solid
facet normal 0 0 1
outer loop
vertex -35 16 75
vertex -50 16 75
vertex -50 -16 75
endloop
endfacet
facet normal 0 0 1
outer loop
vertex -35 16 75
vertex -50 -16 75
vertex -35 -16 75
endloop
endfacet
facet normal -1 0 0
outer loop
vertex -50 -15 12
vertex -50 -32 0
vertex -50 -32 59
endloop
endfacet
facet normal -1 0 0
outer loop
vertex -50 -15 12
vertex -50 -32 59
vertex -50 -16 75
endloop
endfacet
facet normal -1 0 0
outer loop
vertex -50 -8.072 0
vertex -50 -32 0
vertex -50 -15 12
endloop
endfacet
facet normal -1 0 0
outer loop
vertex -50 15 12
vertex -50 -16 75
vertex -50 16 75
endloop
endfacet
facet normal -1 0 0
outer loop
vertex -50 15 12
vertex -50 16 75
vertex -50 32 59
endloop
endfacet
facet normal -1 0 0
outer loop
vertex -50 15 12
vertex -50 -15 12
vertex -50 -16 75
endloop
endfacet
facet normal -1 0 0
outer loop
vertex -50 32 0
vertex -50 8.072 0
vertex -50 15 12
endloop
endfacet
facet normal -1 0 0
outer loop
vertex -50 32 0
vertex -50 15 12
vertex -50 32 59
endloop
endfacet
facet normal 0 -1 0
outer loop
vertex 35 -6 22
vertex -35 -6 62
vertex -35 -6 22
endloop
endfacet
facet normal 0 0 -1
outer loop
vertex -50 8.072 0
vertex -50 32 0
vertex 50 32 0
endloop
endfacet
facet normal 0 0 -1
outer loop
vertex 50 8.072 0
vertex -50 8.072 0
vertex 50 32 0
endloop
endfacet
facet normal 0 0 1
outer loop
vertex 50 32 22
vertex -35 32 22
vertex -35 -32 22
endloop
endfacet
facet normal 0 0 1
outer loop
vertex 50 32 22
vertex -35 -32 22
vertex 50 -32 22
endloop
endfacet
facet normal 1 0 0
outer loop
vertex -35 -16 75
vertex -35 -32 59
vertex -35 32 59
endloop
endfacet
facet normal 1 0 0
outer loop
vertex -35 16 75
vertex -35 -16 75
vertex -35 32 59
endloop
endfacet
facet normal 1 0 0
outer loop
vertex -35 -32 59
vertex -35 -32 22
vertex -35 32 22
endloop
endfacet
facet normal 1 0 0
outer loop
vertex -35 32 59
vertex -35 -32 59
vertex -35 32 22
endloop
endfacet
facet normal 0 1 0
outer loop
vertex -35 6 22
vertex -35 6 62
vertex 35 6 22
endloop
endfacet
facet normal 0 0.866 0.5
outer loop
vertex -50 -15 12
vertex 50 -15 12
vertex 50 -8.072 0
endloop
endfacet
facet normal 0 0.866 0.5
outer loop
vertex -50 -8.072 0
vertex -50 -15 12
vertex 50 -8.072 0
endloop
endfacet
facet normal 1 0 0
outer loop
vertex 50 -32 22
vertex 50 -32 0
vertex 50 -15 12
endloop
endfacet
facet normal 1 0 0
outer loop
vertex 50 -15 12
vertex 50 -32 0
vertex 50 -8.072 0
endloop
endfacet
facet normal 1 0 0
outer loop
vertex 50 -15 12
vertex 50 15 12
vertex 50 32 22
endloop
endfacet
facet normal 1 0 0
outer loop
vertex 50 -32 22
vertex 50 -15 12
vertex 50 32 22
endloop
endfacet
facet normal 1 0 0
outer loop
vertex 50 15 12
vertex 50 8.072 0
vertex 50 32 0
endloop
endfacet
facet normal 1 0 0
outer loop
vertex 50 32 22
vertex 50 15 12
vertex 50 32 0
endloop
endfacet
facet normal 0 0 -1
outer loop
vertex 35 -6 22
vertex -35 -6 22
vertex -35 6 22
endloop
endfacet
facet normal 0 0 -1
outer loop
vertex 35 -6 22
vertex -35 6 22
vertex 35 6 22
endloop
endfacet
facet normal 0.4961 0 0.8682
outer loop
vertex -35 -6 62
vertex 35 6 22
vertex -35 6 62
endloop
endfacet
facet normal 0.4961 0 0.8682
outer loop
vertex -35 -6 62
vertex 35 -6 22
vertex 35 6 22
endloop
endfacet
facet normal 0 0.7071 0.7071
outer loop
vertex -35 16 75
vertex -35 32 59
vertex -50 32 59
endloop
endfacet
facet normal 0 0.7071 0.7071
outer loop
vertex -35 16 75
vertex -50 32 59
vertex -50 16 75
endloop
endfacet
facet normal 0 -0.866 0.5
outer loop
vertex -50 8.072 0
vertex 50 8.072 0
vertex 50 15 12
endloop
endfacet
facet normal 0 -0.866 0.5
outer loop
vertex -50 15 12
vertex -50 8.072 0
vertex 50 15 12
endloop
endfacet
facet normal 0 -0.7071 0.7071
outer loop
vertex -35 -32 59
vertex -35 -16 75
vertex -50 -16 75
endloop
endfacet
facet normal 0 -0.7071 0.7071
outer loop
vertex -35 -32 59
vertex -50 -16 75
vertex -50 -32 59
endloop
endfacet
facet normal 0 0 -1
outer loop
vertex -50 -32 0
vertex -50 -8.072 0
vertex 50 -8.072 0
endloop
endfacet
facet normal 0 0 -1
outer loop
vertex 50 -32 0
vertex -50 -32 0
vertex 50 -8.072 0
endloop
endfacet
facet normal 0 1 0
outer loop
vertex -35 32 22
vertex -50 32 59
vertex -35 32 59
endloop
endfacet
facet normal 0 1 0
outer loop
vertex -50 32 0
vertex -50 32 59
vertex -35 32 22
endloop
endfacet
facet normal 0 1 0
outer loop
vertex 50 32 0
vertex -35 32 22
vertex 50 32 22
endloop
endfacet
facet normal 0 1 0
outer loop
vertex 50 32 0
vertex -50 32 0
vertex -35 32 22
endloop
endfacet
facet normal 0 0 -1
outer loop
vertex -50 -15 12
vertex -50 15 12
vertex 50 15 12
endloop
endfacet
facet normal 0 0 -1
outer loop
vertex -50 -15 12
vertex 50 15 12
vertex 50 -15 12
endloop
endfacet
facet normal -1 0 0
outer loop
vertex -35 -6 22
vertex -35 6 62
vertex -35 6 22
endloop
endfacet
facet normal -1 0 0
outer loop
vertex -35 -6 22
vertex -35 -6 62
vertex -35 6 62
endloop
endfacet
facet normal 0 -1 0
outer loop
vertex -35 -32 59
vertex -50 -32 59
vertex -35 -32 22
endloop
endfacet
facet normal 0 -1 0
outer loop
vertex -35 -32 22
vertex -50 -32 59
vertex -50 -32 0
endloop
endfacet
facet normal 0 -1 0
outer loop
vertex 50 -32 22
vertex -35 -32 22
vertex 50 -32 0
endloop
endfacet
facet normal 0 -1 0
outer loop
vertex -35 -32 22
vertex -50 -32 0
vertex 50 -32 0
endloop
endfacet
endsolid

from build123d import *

# Parameters (mm, degrees)
PAD002_DEPTH    = 6
SKETCH_W        = 100
SKETCH_H        = 64
PAD_DEPTH       = 22
SKETCH001_W     = 15
SKETCH001_H     = 64
PAD001_DEPTH    = 53
POCKET_DEPTH    = 100.001
POCKET001_DEPTH = 15.001


with BuildPart() as pad002:
    # Sketch003 → Pad002 (new body, symmetric)
    with BuildSketch(Plane.XZ):
        Polygon((-35, 62), (-35, 22), (35, 22), align=None)
    extrude(amount=PAD002_DEPTH, both=True)


with BuildPart() as pocket001:
    # Sketch → Pad (new body)
    with BuildSketch(Plane.XY):
        Rectangle(SKETCH_W, SKETCH_H)
    extrude(amount=PAD_DEPTH)

    # Sketch001 → Pad001 (new body)
    with BuildSketch(Plane.XY.offset(22)):
        with Locations((-42.5, 0)):
            Rectangle(SKETCH001_W, SKETCH001_H)
    extrude(amount=PAD001_DEPTH)

    # Sketch002 → Pocket (cut, through all)
    with BuildSketch(Plane.YZ.offset(50)):
        Polygon((-8.071797, 0), (8.071797, 0), (15, 12), (-15, 12), align=None)
    extrude(amount=-POCKET_DEPTH, mode=Mode.SUBTRACT)

    # Sketch004 → Pocket001 (cut, through all)
    with BuildSketch(Plane.YZ.offset(-35)):
        Polygon((-32, 59), (-32, 75), (-16, 75), align=None)
        Polygon((16, 75), (32, 75), (32, 59), align=None)
    extrude(amount=-POCKET001_DEPTH, mode=Mode.SUBTRACT)


solid = Compound([pad002.part, pocket001.part])
